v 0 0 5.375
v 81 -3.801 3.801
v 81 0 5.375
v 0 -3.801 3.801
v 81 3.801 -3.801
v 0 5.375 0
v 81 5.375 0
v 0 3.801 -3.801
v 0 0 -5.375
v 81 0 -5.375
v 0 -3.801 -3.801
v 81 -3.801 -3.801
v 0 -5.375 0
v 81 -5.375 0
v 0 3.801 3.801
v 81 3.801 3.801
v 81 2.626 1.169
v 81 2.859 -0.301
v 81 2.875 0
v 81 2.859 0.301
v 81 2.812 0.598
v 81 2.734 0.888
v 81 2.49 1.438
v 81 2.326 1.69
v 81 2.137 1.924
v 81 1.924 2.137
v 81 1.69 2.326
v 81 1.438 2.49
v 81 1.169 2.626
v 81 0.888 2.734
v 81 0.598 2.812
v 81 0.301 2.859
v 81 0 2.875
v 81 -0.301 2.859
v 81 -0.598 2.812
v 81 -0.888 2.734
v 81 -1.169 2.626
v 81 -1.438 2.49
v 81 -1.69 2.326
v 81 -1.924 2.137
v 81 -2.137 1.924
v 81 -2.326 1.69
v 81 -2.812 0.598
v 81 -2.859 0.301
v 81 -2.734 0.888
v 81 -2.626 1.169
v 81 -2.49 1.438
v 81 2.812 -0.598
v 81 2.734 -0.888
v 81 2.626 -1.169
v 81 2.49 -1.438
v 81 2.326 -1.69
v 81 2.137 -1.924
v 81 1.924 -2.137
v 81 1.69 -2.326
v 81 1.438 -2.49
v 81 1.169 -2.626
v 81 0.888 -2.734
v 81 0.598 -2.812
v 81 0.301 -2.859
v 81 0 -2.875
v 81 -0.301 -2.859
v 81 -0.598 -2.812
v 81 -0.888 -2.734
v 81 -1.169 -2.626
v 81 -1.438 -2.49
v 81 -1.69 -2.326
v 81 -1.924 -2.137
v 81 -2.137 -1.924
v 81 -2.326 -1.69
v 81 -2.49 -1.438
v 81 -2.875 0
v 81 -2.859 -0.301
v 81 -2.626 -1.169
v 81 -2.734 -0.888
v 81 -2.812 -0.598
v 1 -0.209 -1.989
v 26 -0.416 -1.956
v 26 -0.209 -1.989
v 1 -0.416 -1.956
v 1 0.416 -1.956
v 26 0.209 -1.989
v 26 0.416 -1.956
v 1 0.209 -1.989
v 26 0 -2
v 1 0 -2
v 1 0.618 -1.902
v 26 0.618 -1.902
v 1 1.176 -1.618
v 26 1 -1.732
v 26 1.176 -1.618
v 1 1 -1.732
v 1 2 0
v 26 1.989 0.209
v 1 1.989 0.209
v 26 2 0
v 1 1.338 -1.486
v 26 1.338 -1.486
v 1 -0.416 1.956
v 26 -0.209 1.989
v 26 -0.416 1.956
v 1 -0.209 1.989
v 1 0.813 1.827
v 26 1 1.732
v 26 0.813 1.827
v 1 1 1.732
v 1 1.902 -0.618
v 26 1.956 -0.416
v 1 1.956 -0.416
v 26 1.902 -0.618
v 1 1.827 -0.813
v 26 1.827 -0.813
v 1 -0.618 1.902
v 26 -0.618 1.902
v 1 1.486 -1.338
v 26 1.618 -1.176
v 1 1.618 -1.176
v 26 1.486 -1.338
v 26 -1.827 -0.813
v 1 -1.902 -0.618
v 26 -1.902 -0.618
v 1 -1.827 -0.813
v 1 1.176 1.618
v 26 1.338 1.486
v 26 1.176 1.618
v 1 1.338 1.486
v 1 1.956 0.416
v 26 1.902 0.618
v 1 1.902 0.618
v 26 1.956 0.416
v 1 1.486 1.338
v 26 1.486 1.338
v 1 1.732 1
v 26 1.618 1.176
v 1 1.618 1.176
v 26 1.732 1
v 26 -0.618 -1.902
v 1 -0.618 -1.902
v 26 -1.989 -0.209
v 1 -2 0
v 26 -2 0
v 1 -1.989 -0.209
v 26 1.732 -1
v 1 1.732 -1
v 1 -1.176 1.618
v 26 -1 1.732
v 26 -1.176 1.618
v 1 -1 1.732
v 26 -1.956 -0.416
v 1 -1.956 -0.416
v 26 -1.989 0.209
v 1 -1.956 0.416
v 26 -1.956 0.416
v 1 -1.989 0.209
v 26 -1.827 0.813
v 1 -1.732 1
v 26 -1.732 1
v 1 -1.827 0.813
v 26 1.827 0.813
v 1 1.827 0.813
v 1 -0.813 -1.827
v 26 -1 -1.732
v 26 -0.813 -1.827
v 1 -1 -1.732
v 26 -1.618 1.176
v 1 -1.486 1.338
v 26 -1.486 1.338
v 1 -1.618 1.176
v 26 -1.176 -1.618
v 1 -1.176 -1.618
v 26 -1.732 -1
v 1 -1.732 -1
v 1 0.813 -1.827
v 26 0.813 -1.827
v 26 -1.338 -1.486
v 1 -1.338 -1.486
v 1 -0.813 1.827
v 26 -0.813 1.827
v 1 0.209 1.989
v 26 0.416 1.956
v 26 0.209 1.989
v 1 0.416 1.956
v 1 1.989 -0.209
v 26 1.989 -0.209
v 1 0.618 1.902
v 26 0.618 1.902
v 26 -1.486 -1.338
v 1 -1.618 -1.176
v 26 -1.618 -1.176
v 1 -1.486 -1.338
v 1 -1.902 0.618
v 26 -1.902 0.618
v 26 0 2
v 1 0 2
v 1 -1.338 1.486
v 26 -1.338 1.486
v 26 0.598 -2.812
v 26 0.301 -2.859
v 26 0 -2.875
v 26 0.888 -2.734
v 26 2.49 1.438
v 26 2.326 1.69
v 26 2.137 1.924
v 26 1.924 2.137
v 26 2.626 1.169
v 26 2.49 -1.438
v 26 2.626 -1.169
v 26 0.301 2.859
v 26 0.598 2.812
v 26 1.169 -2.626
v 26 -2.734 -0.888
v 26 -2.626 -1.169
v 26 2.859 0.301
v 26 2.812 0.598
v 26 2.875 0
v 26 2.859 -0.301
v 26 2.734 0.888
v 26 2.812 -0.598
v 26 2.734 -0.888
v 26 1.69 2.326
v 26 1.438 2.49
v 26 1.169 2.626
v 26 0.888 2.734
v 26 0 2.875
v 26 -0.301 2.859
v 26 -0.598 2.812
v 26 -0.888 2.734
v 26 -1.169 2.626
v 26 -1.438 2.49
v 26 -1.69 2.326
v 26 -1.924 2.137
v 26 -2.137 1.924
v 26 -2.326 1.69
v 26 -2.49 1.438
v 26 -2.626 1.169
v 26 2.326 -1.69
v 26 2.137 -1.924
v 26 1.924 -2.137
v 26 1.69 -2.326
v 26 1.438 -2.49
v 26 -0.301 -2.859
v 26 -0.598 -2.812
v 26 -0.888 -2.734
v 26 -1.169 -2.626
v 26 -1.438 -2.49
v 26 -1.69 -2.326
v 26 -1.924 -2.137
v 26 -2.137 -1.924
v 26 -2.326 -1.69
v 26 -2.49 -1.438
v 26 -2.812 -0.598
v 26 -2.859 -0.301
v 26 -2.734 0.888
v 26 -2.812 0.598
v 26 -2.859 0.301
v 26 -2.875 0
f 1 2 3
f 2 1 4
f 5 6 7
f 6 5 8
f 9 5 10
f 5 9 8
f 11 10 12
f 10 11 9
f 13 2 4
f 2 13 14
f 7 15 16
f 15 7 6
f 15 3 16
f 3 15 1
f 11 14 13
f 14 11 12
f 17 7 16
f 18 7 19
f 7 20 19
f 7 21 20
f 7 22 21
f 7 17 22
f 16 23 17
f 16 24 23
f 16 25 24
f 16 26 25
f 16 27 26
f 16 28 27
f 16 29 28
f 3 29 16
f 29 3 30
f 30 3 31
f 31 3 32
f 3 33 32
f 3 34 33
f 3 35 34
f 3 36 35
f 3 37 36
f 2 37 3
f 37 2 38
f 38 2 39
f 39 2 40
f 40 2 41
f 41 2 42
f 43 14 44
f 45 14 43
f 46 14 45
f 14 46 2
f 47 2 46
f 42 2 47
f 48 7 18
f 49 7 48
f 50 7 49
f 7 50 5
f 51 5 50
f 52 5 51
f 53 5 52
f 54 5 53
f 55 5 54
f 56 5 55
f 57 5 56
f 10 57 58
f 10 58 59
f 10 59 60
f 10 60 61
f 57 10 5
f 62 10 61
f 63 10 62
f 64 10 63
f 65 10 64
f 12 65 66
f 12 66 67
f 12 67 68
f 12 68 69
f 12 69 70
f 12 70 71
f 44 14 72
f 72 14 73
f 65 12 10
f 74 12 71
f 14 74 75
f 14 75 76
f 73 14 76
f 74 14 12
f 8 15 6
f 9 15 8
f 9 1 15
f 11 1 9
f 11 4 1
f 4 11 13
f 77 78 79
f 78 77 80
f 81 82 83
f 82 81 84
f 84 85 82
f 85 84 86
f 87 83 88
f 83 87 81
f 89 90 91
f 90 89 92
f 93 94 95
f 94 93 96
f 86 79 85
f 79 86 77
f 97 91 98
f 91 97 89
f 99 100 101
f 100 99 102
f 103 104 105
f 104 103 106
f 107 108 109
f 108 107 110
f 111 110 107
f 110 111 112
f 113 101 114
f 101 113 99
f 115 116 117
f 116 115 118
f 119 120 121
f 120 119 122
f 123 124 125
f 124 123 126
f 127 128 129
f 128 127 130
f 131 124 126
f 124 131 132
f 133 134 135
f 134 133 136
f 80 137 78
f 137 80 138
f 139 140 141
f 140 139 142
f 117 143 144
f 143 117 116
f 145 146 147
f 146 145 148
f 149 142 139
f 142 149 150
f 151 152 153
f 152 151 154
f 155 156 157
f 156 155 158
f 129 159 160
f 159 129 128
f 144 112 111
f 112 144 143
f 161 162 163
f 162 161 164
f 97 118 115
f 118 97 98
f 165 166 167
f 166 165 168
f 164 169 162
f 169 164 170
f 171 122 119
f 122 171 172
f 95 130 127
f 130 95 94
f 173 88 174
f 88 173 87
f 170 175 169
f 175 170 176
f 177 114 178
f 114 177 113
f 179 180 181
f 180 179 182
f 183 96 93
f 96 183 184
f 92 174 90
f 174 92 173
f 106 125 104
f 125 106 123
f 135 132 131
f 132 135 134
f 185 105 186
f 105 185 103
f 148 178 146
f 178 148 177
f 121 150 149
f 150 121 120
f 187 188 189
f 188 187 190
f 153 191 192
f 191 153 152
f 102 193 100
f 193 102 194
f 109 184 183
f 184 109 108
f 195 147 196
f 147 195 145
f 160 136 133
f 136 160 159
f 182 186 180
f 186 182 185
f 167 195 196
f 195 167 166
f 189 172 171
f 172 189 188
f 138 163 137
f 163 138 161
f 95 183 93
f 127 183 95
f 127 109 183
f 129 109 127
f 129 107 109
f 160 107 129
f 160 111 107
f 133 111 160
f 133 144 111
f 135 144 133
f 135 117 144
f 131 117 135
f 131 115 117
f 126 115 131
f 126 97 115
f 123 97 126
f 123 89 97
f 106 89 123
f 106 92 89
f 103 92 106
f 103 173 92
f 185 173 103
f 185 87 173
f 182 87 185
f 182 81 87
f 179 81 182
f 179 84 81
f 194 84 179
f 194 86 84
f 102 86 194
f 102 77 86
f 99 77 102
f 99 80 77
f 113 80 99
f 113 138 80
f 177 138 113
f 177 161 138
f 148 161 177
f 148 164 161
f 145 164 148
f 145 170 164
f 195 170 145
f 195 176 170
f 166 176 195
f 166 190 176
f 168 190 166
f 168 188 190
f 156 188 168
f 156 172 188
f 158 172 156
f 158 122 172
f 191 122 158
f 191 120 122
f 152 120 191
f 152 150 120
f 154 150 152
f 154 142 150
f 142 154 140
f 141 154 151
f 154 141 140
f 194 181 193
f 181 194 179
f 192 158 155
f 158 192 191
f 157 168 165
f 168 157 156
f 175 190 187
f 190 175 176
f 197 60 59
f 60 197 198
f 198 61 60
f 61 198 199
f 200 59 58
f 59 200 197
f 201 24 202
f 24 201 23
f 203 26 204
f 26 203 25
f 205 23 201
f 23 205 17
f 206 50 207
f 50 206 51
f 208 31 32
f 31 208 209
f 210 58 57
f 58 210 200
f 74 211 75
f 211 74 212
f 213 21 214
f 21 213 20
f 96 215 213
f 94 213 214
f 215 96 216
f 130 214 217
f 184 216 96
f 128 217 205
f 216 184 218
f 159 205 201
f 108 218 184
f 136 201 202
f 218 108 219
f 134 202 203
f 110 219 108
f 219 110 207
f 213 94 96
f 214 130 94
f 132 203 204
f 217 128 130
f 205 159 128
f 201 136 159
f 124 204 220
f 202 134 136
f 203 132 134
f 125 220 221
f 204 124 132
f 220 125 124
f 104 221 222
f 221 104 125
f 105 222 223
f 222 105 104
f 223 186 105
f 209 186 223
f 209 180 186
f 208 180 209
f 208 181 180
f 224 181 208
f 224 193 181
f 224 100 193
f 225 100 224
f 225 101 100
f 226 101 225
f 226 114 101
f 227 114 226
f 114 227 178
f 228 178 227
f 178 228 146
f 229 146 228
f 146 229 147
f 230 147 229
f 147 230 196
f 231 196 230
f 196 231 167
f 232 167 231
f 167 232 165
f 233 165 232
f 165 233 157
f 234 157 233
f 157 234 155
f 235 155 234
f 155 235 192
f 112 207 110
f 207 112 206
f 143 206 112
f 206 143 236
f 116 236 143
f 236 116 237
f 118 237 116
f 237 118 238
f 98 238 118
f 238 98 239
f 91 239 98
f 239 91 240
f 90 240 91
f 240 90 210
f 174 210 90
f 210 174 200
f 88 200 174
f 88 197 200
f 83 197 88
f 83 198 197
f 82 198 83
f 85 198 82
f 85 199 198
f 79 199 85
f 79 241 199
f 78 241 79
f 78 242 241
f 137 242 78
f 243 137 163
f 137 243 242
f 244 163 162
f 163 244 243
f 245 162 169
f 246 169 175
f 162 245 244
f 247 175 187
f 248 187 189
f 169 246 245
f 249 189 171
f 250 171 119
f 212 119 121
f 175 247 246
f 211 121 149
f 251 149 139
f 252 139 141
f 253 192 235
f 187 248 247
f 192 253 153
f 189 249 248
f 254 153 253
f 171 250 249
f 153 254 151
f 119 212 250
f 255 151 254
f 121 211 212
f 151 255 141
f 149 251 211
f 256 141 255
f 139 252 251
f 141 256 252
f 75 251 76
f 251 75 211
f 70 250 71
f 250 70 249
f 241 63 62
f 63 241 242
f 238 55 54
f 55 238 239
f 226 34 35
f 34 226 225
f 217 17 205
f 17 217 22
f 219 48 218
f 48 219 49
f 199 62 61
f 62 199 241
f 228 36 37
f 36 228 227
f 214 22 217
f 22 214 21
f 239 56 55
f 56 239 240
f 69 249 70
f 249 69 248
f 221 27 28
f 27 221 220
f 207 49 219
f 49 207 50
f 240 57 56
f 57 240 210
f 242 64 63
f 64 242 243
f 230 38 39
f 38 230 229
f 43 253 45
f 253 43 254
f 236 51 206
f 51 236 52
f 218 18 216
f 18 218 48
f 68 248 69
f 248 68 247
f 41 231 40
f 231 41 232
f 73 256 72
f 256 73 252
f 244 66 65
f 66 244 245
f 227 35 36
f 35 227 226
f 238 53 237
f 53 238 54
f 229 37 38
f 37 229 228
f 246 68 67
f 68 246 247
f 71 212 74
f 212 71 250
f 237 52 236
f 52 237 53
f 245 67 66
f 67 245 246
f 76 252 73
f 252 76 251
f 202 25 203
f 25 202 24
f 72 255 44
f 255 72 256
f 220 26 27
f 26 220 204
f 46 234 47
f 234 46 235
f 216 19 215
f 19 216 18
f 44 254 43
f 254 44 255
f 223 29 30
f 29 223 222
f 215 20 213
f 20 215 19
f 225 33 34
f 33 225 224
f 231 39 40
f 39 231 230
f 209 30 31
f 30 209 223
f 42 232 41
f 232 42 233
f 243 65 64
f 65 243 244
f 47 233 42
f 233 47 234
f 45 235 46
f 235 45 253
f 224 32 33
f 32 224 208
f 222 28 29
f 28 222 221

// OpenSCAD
$fn = 60;
rotate([0,90,0]) {
	difference() {
		cylinder(
			r = 4.75/2 + 3,
			h = 25+55+1,
			$fn = 8
		);
		translate([0, 0, 1]) {
			cylinder(
				r = 4/2,
				h = 26
			);
		}
		translate([0, 0, 26]) {
			cylinder(
				r = 4.75/2 + .5,
				h = 56
			);
		}
	}
}
